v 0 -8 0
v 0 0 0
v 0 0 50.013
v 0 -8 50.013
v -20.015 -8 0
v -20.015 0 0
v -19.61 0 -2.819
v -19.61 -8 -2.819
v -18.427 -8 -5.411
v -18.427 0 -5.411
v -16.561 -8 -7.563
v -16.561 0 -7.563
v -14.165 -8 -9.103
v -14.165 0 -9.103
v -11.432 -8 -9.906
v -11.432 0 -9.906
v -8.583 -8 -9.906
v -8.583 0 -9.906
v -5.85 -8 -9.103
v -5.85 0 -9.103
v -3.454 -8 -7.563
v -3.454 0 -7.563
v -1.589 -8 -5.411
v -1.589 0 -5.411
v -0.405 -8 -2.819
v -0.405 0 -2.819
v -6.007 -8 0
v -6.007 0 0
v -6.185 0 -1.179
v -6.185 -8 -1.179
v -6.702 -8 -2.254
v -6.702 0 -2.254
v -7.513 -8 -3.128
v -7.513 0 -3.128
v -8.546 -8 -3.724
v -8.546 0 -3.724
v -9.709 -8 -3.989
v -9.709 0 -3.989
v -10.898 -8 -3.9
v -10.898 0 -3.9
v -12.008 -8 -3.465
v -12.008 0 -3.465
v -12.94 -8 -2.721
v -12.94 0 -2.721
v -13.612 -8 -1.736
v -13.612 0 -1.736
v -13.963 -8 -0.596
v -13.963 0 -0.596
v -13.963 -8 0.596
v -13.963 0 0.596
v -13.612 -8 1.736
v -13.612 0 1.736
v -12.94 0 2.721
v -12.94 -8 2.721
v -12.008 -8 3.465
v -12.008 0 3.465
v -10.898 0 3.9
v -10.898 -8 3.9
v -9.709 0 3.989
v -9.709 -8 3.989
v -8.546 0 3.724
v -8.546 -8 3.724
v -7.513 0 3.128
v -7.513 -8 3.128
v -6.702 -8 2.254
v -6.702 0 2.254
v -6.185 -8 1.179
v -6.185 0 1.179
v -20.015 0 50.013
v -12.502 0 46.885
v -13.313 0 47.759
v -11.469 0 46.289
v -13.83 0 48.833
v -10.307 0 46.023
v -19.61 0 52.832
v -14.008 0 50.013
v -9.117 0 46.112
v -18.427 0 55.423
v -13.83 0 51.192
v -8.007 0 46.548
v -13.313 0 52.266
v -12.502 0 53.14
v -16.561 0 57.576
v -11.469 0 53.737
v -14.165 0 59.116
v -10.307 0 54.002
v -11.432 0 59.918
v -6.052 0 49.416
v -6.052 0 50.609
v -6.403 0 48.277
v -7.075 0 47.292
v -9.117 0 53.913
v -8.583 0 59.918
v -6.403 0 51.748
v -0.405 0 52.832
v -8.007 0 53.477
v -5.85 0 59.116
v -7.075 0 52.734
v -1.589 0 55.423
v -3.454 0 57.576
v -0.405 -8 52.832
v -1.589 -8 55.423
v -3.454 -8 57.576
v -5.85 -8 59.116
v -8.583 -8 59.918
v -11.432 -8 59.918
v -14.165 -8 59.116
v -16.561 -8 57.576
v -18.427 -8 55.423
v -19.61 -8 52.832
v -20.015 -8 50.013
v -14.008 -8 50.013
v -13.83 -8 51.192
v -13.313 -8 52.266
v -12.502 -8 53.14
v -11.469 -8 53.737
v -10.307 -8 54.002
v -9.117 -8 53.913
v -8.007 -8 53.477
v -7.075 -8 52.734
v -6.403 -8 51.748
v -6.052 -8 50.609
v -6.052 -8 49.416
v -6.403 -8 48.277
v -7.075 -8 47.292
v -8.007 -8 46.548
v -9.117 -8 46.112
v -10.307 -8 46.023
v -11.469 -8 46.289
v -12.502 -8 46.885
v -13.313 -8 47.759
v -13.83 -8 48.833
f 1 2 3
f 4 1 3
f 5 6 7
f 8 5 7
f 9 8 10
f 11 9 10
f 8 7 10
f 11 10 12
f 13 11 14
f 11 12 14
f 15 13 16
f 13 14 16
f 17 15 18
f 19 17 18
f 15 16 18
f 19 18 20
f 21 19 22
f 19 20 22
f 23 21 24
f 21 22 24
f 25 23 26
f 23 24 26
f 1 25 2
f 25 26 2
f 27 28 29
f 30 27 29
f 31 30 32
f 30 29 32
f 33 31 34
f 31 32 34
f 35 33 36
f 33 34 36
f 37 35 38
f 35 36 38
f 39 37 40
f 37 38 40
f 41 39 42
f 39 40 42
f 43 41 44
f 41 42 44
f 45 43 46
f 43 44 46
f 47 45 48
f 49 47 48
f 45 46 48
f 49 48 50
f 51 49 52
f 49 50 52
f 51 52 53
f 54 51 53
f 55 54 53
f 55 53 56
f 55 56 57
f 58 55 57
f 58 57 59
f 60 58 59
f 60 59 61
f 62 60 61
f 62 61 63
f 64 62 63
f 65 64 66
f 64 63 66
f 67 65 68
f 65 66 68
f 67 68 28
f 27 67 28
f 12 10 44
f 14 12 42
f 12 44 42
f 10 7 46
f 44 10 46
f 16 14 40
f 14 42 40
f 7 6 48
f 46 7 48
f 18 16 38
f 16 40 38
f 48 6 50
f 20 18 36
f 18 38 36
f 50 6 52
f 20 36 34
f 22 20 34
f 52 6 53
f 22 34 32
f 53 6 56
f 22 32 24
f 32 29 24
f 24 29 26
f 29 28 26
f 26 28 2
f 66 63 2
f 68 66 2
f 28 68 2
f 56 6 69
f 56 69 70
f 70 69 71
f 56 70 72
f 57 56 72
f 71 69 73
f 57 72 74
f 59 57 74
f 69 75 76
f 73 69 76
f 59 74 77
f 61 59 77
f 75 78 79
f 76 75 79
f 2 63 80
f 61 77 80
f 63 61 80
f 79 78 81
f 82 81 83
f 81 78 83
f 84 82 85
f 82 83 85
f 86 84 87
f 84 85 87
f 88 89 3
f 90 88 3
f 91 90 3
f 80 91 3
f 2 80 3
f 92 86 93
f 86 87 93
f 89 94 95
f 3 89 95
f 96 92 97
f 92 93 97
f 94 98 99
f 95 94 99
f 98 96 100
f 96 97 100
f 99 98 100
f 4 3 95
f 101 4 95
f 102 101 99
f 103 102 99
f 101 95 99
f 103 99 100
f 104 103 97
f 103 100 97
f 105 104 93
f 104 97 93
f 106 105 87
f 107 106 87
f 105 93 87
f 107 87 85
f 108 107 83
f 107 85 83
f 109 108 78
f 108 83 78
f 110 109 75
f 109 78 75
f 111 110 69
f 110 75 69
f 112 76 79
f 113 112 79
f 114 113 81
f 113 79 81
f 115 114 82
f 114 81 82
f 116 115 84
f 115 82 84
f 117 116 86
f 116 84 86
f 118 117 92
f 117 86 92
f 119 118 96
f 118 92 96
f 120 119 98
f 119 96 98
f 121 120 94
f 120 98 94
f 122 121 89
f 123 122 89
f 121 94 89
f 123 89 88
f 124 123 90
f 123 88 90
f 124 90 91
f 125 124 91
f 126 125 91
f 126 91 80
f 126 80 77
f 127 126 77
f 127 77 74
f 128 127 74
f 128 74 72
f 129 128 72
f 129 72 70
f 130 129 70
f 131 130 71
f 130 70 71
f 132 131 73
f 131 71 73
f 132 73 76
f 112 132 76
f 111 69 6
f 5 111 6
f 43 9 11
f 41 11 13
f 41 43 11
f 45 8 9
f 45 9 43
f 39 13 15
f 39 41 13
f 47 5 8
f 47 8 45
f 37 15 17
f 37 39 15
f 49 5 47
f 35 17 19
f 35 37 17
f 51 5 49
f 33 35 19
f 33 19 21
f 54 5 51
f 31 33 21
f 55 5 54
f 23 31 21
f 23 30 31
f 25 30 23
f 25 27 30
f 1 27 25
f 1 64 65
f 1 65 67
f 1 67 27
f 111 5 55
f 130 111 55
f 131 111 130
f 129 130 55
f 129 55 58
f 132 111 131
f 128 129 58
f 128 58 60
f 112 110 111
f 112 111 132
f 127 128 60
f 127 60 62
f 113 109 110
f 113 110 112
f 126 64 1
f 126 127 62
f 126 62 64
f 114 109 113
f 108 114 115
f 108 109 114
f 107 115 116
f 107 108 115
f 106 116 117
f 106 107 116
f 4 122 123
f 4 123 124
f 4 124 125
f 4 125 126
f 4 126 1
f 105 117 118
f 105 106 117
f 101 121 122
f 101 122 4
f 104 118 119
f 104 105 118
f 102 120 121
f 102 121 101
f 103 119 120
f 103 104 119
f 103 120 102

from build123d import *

# Parameters (mm, degrees)
F1_DEPTH = 8


with BuildPart() as f1:
    # F0 (on Front) → F1 (new body)
    with BuildSketch(Plane.XZ):
        with BuildLine():
            Line((0, 50.0126), (-6.0071, 50.0126))
            ThreePointArc((-6.0071, 50.0126), (-10.0076, 46.0121), (-14.0081, 50.0126))
            Line((-14.0081, 50.0126), (-20.0152, 50.0126))
            ThreePointArc((-20.0152, 50.0126), (-10.0076, 40.005), (0, 50.0126))
        make_face()
        with BuildLine():
            ThreePointArc((-14.0081, 50.0126), (-10.0076, 54.0131), (-6.0071, 50.0126))
            Line((-6.0071, 50.0126), (0, 50.0126))
            ThreePointArc((0, 50.0126), (-10.0076, 60.0202), (-20.0152, 50.0126))
            Line((-20.0152, 50.0126), (-14.0081, 50.0126))
        make_face()
        with BuildLine():
            Line((0, 0), (0, 50.0126))
            ThreePointArc((0, 50.0126), (-10.0076, 40.005), (-20.0152, 50.0126))
            Line((-20.0152, 50.0126), (-20.0152, 0))
            ThreePointArc((-20.0152, 0), (-10.0076, 10.0076), (0, 0))
        make_face()
        with BuildLine():
            ThreePointArc((-20.0152, 0), (-10.0076, -10.0076), (0, 0))
            Line((0, 0), (-6.0071, 0))
            ThreePointArc((-6.0071, 0), (-10.0076, -4.0005), (-14.0081, 0))
            Line((-14.0081, 0), (-20.0152, 0))
        make_face()
        with BuildLine():
            Line((-6.0071, 0), (0, 0))
            ThreePointArc((0, 0), (-10.0076, 10.0076), (-20.0152, 0))
            Line((-20.0152, 0), (-14.0081, 0))
            ThreePointArc((-14.0081, 0), (-10.0076, 4.0005), (-6.0071, 0))
        make_face()
    extrude(amount=F1_DEPTH)


solid = f1.part
